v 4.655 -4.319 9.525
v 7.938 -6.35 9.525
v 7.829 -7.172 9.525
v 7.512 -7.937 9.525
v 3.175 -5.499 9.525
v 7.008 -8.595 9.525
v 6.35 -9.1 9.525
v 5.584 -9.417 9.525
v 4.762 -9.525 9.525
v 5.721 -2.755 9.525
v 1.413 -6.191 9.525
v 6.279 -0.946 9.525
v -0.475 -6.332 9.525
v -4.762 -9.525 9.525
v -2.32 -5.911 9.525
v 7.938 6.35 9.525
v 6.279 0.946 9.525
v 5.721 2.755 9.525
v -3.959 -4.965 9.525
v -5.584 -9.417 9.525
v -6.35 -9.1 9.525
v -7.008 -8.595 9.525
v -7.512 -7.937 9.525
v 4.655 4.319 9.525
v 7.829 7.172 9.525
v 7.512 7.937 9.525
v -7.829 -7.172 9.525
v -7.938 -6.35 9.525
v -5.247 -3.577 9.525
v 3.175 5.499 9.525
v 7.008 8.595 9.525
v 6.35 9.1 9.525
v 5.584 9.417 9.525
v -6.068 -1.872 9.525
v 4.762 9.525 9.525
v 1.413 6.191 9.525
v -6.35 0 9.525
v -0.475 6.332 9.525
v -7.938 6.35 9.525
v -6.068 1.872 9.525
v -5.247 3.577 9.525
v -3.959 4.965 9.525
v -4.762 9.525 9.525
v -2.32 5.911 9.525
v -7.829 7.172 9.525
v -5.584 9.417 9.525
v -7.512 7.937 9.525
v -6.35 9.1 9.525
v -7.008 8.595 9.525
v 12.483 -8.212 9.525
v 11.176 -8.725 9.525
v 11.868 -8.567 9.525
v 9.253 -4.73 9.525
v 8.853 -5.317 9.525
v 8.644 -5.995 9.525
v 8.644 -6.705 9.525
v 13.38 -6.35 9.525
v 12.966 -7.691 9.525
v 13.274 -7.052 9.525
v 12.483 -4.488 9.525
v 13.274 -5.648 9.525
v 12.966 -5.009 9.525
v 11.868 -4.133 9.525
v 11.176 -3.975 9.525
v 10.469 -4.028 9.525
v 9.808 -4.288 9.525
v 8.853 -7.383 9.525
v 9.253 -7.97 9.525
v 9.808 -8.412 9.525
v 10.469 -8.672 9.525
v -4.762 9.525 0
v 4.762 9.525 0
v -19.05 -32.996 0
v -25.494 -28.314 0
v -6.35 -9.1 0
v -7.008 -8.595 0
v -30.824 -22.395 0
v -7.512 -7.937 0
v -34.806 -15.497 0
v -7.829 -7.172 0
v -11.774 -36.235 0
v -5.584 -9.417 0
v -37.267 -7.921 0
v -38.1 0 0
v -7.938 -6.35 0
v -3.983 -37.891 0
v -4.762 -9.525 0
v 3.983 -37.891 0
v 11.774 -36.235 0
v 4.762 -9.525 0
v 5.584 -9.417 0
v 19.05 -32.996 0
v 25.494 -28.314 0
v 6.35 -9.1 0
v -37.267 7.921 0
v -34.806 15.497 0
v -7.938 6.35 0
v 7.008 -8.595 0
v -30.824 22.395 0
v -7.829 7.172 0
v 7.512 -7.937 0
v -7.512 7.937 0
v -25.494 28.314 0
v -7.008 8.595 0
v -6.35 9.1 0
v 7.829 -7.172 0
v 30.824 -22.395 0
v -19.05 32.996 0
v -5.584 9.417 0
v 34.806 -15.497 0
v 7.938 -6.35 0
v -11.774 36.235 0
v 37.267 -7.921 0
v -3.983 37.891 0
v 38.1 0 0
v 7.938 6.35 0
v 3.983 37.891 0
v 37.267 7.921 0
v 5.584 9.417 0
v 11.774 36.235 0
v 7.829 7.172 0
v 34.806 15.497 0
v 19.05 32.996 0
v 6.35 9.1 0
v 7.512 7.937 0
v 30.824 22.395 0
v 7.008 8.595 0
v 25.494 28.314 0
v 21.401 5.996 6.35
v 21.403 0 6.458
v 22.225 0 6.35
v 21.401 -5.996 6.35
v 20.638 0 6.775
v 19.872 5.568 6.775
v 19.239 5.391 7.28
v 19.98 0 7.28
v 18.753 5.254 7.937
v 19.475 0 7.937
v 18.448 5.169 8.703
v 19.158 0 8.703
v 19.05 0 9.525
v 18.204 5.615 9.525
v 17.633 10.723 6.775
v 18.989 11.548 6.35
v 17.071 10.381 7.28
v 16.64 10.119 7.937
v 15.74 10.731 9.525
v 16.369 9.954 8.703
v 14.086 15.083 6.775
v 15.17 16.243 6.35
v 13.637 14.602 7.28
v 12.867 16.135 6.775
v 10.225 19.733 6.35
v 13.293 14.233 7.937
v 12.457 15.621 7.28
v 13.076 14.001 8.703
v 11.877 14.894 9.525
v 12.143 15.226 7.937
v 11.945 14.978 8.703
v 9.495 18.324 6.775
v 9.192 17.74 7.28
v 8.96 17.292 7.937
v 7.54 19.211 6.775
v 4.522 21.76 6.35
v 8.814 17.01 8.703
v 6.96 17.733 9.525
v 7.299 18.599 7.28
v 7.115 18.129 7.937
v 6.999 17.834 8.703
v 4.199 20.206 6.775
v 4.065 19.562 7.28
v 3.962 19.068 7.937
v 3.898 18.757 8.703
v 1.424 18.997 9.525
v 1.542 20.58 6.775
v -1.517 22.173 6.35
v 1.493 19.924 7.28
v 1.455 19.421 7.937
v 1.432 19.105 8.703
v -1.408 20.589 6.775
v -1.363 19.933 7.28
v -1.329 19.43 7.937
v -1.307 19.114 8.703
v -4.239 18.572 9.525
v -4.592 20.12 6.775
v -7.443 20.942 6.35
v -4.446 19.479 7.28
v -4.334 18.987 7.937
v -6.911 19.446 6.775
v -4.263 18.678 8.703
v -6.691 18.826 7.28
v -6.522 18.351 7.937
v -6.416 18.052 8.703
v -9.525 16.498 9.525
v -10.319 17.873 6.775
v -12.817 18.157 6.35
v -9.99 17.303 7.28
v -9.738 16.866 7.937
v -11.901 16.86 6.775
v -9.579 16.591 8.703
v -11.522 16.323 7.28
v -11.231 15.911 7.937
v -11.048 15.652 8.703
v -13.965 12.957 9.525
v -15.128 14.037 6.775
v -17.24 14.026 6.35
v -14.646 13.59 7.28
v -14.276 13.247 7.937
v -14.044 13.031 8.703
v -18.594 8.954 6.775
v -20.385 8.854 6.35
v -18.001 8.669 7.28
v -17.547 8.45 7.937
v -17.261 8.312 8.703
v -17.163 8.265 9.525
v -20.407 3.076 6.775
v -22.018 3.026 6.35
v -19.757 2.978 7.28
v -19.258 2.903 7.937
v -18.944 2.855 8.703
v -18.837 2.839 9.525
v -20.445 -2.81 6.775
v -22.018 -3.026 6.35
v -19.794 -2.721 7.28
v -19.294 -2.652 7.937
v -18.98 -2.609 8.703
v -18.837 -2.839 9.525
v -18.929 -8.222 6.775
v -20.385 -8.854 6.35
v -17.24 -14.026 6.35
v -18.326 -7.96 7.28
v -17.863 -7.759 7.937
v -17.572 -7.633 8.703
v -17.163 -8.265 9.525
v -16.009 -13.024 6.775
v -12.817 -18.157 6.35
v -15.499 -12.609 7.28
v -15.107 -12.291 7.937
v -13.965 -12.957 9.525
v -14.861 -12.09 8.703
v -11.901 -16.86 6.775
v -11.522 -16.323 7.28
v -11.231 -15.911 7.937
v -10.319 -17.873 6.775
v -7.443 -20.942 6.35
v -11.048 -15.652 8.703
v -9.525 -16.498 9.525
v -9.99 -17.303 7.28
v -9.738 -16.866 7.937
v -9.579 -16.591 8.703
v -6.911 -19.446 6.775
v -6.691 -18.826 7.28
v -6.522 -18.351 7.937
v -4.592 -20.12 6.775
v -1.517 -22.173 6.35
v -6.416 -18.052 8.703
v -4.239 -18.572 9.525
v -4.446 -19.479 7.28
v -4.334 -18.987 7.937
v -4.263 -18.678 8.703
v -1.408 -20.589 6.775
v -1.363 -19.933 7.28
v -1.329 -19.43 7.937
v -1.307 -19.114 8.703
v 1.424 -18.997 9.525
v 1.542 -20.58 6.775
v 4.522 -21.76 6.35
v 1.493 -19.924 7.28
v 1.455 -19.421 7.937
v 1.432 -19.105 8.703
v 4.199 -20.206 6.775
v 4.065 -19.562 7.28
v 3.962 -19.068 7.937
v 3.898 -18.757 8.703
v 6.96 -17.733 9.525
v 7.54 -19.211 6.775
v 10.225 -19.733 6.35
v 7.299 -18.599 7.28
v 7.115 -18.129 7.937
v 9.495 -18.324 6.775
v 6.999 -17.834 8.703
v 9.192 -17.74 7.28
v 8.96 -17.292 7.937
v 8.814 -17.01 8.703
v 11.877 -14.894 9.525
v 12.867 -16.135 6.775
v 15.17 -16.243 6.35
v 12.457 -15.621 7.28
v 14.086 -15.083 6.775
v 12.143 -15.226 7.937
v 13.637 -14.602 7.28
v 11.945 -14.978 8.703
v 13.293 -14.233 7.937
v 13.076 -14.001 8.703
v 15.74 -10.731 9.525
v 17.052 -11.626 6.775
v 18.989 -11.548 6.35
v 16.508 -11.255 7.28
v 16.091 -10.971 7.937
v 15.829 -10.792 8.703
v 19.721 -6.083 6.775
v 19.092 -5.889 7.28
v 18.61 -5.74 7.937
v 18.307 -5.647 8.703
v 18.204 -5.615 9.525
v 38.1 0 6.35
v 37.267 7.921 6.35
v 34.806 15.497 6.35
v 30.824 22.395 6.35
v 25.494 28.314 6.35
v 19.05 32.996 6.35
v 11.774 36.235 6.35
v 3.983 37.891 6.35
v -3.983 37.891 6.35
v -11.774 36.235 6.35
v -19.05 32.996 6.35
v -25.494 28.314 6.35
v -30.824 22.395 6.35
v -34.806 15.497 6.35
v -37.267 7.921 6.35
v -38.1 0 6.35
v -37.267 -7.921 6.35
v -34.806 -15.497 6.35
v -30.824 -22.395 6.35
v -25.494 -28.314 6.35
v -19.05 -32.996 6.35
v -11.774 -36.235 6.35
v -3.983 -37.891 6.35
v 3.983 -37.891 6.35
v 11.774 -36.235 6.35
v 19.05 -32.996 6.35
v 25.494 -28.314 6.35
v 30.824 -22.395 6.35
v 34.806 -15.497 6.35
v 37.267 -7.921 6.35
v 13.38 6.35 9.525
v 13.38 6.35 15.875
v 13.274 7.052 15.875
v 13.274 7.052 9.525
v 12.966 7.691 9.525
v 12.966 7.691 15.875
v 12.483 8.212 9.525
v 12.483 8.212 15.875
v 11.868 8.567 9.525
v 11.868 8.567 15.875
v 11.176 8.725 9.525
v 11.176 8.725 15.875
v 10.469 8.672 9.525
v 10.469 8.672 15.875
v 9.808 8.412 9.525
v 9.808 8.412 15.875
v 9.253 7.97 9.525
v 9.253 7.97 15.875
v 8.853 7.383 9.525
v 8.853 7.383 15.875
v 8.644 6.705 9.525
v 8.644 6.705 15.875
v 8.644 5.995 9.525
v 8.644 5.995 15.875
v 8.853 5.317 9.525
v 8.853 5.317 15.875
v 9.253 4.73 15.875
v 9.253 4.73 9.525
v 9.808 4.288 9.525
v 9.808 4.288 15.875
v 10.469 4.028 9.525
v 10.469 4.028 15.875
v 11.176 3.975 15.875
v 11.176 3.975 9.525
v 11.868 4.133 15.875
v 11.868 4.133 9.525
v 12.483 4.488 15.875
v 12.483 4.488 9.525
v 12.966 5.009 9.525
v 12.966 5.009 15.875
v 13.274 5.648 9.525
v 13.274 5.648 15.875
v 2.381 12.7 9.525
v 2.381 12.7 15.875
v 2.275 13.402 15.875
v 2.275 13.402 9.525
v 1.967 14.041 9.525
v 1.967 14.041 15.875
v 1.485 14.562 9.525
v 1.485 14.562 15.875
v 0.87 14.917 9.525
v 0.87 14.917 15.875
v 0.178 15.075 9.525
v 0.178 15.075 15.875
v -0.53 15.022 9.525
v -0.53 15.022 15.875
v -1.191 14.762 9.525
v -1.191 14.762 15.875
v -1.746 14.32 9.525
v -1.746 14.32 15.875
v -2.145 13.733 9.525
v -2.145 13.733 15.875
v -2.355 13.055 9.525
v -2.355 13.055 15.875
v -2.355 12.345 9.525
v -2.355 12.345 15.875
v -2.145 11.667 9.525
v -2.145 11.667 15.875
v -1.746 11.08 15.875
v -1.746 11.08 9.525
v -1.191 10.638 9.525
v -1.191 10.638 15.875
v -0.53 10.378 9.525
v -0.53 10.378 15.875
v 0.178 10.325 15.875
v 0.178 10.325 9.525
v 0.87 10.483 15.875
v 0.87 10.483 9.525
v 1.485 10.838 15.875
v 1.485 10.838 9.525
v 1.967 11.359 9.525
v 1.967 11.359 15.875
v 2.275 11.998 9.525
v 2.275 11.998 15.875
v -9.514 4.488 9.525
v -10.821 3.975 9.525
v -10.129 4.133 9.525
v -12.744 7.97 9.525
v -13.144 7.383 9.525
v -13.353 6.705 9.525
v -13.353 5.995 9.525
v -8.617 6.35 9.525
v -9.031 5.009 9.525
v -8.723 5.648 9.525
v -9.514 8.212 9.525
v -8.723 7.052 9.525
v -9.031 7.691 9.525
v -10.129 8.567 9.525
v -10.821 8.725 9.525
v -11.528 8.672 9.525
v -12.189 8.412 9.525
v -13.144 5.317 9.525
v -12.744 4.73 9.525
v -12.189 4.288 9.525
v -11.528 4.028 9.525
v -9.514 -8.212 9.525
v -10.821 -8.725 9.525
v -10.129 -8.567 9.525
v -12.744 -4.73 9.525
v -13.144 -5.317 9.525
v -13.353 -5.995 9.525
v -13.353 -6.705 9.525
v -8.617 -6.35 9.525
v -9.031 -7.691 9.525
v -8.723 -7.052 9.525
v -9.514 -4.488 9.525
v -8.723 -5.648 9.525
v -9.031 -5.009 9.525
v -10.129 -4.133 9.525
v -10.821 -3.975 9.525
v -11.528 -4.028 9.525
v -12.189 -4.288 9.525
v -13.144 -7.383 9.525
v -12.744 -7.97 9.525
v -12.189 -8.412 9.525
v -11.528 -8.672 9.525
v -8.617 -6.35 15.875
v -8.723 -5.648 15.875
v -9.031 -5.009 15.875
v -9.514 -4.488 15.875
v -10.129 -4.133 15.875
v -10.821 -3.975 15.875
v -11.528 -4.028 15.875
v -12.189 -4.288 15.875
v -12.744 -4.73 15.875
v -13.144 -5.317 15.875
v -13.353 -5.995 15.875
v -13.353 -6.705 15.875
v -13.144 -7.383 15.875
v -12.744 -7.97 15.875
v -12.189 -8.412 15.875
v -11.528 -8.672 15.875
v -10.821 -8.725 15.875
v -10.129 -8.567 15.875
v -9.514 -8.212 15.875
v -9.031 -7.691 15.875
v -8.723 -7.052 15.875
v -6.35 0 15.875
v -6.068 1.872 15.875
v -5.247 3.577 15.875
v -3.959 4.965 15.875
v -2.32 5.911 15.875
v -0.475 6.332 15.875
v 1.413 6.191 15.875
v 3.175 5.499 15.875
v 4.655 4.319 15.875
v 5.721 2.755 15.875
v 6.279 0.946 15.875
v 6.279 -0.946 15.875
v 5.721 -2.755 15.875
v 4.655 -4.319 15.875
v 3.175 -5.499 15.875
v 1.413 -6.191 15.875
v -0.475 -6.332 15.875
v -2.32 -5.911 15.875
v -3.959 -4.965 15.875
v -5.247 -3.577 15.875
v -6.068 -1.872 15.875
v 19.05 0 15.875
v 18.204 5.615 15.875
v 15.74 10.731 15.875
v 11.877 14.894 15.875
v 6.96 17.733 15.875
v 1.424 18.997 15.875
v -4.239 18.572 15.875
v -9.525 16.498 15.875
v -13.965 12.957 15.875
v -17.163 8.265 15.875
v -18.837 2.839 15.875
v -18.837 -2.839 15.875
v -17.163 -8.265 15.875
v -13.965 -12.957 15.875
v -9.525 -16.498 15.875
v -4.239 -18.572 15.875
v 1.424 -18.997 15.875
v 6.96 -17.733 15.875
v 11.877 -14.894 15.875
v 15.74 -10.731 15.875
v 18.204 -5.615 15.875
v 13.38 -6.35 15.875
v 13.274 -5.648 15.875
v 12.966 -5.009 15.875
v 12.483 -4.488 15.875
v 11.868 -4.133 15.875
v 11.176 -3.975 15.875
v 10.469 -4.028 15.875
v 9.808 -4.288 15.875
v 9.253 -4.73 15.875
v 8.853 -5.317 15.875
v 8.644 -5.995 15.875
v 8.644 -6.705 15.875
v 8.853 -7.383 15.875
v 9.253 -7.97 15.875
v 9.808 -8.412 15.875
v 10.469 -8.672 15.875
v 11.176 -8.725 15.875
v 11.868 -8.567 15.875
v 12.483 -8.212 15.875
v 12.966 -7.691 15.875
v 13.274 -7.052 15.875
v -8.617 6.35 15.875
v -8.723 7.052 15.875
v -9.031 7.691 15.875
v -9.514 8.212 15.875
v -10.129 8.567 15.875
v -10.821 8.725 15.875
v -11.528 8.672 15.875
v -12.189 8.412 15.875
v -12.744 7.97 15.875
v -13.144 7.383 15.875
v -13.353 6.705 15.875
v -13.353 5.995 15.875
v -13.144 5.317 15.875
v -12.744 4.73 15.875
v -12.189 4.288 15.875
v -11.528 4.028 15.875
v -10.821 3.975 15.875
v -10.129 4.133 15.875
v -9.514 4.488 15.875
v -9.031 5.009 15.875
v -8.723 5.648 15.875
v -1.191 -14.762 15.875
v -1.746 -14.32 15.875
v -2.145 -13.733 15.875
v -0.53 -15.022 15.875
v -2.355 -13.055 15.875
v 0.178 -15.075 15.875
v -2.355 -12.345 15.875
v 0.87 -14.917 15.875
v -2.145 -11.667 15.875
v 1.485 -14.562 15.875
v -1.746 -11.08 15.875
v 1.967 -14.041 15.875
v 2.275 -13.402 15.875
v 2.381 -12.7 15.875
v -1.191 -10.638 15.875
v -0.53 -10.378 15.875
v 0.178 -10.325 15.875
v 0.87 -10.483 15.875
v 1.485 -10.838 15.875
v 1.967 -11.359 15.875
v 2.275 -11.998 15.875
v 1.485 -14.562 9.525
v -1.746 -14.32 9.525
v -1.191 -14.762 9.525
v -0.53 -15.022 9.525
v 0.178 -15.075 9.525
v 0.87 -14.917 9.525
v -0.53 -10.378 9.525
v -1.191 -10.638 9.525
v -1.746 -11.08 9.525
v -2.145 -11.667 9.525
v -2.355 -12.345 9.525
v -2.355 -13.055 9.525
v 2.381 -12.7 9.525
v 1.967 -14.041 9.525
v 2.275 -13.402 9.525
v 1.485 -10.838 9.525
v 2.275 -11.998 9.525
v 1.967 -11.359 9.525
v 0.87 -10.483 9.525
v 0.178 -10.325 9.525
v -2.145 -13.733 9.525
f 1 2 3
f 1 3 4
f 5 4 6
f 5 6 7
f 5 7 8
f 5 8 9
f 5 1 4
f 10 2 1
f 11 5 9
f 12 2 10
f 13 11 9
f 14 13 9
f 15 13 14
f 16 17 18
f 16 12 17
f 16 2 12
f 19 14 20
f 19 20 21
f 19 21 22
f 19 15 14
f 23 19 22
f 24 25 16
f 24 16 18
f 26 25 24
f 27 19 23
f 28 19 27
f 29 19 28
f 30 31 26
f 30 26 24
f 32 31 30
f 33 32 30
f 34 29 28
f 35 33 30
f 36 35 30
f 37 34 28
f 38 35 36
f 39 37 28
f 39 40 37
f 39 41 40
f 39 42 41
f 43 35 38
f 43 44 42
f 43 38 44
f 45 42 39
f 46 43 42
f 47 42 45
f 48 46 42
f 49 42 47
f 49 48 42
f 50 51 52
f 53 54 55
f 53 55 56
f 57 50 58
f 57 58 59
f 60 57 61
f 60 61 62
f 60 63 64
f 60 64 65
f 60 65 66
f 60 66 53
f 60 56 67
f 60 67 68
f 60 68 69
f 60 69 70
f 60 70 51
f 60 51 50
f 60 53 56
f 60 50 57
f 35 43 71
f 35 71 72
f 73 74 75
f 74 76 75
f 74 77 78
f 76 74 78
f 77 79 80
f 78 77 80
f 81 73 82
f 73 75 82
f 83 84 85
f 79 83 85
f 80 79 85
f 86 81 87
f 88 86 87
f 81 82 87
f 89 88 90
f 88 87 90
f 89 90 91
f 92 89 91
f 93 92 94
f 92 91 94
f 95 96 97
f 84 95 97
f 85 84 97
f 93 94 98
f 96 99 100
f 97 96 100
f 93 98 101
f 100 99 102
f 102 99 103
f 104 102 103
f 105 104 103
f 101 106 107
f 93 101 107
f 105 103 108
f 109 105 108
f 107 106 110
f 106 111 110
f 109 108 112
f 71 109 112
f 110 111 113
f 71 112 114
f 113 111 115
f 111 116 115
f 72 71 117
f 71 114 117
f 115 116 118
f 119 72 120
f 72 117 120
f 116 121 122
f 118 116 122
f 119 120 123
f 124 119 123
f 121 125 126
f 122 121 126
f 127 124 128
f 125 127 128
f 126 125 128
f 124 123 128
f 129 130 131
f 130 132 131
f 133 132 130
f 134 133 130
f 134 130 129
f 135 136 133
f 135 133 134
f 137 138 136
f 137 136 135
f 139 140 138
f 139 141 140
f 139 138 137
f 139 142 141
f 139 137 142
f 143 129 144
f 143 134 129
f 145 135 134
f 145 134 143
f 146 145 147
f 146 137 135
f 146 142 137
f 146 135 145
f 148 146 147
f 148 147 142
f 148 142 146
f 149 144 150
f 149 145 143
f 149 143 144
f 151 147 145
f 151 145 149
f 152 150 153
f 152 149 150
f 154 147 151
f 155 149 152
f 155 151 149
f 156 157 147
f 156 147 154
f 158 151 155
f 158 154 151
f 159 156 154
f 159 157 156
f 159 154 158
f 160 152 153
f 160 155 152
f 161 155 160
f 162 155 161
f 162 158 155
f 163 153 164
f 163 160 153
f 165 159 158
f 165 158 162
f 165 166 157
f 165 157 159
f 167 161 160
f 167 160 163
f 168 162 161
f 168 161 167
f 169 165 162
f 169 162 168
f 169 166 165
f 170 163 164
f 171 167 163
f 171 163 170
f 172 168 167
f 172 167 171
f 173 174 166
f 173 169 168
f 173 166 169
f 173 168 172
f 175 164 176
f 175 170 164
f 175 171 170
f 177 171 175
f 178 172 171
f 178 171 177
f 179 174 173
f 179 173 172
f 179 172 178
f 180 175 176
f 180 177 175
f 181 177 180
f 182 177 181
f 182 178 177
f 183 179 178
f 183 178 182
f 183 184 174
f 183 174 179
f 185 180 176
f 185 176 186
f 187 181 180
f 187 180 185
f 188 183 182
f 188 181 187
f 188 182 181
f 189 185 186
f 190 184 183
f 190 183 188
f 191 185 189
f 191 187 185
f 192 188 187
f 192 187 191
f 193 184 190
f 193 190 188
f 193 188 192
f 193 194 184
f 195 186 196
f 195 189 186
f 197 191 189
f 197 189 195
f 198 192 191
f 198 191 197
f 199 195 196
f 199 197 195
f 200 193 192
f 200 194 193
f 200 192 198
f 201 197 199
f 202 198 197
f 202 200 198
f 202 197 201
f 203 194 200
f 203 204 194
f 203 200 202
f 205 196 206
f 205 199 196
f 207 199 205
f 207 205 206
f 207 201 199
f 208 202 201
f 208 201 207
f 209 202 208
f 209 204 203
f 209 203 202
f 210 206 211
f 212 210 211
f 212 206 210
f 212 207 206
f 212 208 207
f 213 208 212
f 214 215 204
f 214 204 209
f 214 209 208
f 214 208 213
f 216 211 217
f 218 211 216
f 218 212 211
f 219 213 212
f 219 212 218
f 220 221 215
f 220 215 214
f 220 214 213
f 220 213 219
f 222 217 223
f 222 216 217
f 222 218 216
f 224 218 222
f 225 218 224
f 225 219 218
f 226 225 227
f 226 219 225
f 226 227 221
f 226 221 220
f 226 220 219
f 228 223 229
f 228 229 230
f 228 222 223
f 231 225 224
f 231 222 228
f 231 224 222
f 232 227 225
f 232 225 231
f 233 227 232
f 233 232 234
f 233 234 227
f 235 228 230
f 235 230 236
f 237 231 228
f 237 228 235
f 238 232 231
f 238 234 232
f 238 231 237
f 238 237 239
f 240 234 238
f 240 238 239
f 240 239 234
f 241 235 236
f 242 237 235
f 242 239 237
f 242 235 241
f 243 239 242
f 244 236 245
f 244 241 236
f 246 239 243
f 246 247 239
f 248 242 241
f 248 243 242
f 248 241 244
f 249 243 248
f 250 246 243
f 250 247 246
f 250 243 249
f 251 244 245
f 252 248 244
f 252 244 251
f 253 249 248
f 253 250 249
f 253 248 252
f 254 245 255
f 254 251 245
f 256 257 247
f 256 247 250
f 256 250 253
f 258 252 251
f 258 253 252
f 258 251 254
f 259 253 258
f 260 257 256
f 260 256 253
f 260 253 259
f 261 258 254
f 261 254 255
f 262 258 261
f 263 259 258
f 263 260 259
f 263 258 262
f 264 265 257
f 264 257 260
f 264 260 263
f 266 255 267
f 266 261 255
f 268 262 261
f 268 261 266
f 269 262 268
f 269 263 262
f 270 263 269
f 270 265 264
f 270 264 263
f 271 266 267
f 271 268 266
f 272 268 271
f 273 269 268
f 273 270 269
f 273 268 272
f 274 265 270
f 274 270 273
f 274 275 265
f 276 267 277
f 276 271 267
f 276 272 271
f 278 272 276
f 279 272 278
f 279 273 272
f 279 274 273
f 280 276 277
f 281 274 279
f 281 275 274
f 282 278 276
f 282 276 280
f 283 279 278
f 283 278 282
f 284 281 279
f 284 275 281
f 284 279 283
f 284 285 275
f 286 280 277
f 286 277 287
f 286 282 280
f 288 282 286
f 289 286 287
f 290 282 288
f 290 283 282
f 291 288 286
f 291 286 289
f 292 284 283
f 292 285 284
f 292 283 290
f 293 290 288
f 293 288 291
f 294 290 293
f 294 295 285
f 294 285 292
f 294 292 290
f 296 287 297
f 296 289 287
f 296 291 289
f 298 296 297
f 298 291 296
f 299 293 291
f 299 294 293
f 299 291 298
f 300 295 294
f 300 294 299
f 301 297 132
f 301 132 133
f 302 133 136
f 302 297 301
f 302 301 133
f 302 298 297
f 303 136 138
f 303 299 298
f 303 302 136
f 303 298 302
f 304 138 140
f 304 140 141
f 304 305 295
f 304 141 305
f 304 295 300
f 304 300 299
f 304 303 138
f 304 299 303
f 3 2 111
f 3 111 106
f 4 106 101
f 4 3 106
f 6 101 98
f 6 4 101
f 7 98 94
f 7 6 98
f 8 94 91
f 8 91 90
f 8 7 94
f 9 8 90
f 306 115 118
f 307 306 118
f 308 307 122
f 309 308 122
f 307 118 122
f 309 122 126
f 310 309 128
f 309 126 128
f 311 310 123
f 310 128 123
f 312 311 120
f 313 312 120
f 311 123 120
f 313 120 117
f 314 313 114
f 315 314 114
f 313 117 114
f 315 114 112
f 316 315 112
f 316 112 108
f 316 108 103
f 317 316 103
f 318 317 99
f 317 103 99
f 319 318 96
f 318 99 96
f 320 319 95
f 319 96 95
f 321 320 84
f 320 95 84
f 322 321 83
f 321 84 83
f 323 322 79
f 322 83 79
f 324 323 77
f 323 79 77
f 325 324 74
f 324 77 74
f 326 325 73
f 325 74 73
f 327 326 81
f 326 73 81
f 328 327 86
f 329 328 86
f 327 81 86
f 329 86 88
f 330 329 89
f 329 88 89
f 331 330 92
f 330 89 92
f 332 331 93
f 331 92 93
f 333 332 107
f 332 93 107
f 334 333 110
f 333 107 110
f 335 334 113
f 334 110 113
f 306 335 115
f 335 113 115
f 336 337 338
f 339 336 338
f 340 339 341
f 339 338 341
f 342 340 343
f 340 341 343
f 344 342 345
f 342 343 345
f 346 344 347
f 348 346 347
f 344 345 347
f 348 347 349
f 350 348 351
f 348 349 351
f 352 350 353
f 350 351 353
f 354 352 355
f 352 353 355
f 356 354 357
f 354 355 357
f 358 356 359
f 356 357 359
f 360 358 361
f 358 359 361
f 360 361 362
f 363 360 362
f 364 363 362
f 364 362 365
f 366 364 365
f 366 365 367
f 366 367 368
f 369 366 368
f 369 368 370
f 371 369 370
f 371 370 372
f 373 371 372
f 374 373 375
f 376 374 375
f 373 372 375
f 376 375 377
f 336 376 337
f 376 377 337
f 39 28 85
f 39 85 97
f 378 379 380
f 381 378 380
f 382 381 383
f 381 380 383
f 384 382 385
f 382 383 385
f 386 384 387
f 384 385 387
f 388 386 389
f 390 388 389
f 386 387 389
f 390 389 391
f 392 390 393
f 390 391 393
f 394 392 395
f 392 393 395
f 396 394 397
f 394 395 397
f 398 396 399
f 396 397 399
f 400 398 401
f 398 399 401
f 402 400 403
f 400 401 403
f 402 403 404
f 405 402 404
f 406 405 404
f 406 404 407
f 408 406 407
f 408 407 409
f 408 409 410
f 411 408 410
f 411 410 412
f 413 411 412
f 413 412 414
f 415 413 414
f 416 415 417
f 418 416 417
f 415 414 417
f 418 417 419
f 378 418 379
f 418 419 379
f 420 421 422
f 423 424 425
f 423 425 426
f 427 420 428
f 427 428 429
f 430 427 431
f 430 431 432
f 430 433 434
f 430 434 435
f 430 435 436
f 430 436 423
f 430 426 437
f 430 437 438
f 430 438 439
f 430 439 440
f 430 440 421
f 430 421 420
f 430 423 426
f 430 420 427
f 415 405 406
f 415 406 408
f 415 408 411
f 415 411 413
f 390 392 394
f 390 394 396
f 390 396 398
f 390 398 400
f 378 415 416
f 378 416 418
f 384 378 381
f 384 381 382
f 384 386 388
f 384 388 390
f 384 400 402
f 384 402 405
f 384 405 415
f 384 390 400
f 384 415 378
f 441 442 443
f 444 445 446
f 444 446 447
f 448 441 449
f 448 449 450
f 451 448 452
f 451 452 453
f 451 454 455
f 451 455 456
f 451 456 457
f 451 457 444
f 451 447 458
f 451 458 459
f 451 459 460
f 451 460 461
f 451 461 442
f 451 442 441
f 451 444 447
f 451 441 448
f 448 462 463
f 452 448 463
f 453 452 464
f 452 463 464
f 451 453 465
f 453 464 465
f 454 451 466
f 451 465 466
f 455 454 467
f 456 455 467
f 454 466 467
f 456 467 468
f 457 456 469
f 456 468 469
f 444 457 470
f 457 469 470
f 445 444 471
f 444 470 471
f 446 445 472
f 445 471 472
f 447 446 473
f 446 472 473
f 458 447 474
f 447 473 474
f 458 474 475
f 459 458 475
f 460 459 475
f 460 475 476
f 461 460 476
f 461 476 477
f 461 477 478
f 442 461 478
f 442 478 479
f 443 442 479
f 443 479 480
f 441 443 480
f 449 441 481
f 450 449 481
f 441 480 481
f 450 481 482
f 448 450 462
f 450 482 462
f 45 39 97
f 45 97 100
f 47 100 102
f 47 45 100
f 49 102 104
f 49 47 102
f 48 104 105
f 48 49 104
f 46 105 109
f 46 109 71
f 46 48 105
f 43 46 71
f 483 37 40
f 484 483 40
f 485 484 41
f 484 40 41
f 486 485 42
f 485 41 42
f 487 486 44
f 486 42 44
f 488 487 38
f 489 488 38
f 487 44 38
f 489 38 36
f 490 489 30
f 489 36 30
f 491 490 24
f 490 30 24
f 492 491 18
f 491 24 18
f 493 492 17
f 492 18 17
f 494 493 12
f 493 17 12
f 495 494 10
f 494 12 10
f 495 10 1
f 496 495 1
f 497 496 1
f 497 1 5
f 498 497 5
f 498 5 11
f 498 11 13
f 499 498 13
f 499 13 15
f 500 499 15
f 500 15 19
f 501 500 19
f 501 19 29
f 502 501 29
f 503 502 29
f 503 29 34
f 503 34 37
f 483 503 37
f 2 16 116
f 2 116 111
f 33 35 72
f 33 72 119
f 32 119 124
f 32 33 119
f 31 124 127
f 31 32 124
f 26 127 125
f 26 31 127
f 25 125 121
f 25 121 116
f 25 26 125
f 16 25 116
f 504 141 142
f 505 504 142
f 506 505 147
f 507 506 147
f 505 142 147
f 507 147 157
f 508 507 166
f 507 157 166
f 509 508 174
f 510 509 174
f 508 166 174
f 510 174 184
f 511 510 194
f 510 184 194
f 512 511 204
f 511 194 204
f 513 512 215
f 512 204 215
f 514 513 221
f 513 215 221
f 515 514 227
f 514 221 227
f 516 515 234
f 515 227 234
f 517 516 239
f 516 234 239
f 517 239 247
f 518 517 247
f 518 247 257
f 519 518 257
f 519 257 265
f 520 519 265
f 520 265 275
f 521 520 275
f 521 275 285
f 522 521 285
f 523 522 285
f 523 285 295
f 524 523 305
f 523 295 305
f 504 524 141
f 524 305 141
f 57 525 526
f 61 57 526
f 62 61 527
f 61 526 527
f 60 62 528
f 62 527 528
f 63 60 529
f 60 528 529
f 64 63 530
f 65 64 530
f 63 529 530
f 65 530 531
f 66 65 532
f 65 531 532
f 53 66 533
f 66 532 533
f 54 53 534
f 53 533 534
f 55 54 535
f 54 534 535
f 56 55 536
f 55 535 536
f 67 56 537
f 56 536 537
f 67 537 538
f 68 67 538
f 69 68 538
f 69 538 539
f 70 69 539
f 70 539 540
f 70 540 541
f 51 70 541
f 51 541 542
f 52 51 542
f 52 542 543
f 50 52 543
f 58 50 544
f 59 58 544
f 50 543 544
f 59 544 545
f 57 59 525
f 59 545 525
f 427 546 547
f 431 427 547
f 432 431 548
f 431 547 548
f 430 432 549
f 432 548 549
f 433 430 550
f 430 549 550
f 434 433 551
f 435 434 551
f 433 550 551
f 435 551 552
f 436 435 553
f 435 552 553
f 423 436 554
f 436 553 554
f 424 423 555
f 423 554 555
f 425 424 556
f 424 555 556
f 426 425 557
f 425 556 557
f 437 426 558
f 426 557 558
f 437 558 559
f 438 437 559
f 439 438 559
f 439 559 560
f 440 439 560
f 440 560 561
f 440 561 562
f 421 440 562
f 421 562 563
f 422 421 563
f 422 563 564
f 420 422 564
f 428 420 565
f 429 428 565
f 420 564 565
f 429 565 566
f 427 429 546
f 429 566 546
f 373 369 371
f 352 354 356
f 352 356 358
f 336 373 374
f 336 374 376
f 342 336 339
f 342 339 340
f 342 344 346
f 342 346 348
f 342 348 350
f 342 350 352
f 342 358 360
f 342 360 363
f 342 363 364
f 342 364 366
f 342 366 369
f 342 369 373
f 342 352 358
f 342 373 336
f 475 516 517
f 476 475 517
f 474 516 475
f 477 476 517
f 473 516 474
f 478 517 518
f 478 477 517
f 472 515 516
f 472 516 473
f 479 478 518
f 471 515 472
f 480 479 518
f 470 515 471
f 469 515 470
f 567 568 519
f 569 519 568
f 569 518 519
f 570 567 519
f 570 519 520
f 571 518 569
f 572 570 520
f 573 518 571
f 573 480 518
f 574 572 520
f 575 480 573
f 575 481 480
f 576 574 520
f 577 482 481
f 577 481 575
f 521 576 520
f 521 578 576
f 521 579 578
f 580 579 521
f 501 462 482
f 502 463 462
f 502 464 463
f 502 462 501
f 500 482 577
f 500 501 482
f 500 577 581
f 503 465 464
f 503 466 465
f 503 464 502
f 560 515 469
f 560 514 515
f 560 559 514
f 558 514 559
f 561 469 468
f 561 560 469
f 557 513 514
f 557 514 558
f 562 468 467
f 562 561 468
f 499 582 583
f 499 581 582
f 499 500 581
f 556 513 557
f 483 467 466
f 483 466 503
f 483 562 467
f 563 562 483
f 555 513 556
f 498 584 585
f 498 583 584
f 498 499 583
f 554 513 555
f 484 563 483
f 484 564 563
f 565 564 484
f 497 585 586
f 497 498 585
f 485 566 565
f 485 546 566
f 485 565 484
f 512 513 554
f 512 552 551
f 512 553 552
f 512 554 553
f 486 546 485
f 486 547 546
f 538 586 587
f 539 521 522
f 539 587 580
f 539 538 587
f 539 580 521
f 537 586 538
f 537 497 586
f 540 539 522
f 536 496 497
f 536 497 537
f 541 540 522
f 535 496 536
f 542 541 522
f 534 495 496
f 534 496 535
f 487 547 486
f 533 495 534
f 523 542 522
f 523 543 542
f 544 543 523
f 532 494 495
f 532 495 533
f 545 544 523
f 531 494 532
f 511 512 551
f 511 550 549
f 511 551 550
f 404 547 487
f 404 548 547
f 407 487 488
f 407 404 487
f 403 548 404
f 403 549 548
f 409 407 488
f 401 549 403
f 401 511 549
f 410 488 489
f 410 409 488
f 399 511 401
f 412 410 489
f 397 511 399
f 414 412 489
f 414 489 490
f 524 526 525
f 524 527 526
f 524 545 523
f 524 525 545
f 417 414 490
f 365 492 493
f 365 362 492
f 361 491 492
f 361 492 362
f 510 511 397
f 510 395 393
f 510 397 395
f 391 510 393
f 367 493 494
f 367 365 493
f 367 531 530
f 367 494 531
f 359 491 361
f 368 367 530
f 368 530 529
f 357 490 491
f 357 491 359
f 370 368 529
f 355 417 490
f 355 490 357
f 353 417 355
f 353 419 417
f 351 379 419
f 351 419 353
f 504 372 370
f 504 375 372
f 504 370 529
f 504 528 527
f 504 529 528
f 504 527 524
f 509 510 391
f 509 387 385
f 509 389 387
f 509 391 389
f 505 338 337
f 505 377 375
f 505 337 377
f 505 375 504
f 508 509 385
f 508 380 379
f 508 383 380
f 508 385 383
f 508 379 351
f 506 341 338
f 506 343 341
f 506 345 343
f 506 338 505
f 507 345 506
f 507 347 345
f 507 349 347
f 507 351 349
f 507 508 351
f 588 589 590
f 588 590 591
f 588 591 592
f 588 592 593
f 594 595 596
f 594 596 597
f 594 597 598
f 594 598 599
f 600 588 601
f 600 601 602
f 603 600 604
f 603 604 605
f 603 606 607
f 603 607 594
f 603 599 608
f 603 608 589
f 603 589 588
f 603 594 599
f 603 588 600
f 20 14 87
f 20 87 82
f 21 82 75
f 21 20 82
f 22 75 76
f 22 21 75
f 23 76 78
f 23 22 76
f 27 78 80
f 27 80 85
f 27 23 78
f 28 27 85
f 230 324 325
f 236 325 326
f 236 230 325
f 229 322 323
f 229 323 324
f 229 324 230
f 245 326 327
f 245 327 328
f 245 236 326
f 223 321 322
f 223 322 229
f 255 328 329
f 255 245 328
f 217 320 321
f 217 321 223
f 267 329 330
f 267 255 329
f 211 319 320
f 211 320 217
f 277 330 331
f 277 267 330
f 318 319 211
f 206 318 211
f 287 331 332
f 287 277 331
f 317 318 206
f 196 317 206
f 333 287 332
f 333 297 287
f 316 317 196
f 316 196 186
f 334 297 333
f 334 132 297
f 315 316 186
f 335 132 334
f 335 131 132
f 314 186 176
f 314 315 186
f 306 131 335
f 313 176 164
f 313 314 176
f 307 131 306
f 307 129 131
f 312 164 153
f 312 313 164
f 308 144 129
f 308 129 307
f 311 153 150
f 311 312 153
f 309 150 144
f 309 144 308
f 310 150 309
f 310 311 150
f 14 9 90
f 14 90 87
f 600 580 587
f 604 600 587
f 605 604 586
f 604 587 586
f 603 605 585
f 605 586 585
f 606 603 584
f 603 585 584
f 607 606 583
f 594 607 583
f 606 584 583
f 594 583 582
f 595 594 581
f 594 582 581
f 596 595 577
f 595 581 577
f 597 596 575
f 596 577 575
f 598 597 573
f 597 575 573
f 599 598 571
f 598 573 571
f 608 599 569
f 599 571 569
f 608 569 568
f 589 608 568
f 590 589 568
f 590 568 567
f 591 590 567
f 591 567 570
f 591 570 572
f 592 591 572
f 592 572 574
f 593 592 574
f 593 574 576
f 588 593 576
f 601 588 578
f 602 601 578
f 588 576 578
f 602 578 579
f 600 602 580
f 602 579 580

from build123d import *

# Parameters (mm, degrees)
SKETCH1_R           = 38.1
BOSS_EXTRUDE1_DEPTH = 6.35
SKETCH2_R           = 19.05
BOSS_EXTRUDE2_DEPTH = 9.525
CUT_EXTRUDE1_START  = -9.525
CUT_EXTRUDE1_DEPTH  = 9.525
SKETCH4_R           = 6.35
CUT_EXTRUDE2_DEPTH  = 7.35
FILLET2_R           = 3.175
SKETCH7_R           = 2.38125
CUT_EXTRUDE4_DEPTH  = 6.35


with BuildPart() as part:
    # Sketch1 → Boss-Extrude1 (new body)
    with BuildSketch(Plane.XY):
        Circle(SKETCH1_R)
    extrude(amount=BOSS_EXTRUDE1_DEPTH)

    # Sketch2 → Boss-Extrude2 (add)
    with BuildSketch(Plane.XY.offset(6.35)):
        Circle(SKETCH2_R)
    extrude(amount=BOSS_EXTRUDE2_DEPTH)

    # Sketch3 → Cut-Extrude1 (cut)
    with BuildSketch(Plane(origin=(0, 0, 0), x_dir=(-1, 0, 0), z_dir=(0, 0, -1)).offset(CUT_EXTRUDE1_START)):
        with BuildLine():
            Line((-4.7625, -9.525), (4.7625, -9.525))
            ThreePointArc((4.7625, -9.525), (7.00756403, -8.59506403), (7.9375, -6.35))
            Line((7.9375, -6.35), (7.9375, 6.35))
            ThreePointArc((7.9375, 6.35), (7.00756403, 8.59506403), (4.7625, 9.525))
            Line((4.7625, 9.525), (-4.7625, 9.525))
            ThreePointArc((-4.7625, 9.525), (-7.00756403, 8.59506403), (-7.9375, 6.35))
            Line((-7.9375, 6.35), (-7.9375, -6.35))
            ThreePointArc((-7.9375, -6.35), (-7.00756403, -8.59506403), (-4.7625, -9.525))
        make_face()
    extrude(amount=CUT_EXTRUDE1_DEPTH, mode=Mode.SUBTRACT)

    # Sketch4 → Cut-Extrude2 (cut, through all)
    with BuildSketch(Plane(origin=(0, 0, 9.525), x_dir=(-1, 0, 0), z_dir=(0, 0, -1))):
        Circle(SKETCH4_R)
    extrude(amount=-CUT_EXTRUDE2_DEPTH, mode=Mode.SUBTRACT)

    # Fillet2
    fillet2_edges = [part.edges().sort_by_distance(p)[0] for p in [
        (-19.05, 0, 6.35),
    ]]
    fillet(fillet2_edges, radius=FILLET2_R)

    # Sketch7 → Cut-Extrude4 (cut)
    with BuildSketch(Plane.XY.offset(15.875)):
        with Locations((0, 12.7)):
            Circle(SKETCH7_R)
        with Locations((10.998522628, 6.35)):
            Circle(SKETCH7_R)
        with Locations((10.998522628, -6.35)):
            Circle(SKETCH7_R)
        with Locations((0, -12.7)):
            Circle(SKETCH7_R)
        with Locations((-10.998522628, -6.35)):
            Circle(SKETCH7_R)
        with Locations((-10.998522628, 6.35)):
            Circle(SKETCH7_R)
    extrude(amount=-CUT_EXTRUDE4_DEPTH, mode=Mode.SUBTRACT)


solid = part.part
